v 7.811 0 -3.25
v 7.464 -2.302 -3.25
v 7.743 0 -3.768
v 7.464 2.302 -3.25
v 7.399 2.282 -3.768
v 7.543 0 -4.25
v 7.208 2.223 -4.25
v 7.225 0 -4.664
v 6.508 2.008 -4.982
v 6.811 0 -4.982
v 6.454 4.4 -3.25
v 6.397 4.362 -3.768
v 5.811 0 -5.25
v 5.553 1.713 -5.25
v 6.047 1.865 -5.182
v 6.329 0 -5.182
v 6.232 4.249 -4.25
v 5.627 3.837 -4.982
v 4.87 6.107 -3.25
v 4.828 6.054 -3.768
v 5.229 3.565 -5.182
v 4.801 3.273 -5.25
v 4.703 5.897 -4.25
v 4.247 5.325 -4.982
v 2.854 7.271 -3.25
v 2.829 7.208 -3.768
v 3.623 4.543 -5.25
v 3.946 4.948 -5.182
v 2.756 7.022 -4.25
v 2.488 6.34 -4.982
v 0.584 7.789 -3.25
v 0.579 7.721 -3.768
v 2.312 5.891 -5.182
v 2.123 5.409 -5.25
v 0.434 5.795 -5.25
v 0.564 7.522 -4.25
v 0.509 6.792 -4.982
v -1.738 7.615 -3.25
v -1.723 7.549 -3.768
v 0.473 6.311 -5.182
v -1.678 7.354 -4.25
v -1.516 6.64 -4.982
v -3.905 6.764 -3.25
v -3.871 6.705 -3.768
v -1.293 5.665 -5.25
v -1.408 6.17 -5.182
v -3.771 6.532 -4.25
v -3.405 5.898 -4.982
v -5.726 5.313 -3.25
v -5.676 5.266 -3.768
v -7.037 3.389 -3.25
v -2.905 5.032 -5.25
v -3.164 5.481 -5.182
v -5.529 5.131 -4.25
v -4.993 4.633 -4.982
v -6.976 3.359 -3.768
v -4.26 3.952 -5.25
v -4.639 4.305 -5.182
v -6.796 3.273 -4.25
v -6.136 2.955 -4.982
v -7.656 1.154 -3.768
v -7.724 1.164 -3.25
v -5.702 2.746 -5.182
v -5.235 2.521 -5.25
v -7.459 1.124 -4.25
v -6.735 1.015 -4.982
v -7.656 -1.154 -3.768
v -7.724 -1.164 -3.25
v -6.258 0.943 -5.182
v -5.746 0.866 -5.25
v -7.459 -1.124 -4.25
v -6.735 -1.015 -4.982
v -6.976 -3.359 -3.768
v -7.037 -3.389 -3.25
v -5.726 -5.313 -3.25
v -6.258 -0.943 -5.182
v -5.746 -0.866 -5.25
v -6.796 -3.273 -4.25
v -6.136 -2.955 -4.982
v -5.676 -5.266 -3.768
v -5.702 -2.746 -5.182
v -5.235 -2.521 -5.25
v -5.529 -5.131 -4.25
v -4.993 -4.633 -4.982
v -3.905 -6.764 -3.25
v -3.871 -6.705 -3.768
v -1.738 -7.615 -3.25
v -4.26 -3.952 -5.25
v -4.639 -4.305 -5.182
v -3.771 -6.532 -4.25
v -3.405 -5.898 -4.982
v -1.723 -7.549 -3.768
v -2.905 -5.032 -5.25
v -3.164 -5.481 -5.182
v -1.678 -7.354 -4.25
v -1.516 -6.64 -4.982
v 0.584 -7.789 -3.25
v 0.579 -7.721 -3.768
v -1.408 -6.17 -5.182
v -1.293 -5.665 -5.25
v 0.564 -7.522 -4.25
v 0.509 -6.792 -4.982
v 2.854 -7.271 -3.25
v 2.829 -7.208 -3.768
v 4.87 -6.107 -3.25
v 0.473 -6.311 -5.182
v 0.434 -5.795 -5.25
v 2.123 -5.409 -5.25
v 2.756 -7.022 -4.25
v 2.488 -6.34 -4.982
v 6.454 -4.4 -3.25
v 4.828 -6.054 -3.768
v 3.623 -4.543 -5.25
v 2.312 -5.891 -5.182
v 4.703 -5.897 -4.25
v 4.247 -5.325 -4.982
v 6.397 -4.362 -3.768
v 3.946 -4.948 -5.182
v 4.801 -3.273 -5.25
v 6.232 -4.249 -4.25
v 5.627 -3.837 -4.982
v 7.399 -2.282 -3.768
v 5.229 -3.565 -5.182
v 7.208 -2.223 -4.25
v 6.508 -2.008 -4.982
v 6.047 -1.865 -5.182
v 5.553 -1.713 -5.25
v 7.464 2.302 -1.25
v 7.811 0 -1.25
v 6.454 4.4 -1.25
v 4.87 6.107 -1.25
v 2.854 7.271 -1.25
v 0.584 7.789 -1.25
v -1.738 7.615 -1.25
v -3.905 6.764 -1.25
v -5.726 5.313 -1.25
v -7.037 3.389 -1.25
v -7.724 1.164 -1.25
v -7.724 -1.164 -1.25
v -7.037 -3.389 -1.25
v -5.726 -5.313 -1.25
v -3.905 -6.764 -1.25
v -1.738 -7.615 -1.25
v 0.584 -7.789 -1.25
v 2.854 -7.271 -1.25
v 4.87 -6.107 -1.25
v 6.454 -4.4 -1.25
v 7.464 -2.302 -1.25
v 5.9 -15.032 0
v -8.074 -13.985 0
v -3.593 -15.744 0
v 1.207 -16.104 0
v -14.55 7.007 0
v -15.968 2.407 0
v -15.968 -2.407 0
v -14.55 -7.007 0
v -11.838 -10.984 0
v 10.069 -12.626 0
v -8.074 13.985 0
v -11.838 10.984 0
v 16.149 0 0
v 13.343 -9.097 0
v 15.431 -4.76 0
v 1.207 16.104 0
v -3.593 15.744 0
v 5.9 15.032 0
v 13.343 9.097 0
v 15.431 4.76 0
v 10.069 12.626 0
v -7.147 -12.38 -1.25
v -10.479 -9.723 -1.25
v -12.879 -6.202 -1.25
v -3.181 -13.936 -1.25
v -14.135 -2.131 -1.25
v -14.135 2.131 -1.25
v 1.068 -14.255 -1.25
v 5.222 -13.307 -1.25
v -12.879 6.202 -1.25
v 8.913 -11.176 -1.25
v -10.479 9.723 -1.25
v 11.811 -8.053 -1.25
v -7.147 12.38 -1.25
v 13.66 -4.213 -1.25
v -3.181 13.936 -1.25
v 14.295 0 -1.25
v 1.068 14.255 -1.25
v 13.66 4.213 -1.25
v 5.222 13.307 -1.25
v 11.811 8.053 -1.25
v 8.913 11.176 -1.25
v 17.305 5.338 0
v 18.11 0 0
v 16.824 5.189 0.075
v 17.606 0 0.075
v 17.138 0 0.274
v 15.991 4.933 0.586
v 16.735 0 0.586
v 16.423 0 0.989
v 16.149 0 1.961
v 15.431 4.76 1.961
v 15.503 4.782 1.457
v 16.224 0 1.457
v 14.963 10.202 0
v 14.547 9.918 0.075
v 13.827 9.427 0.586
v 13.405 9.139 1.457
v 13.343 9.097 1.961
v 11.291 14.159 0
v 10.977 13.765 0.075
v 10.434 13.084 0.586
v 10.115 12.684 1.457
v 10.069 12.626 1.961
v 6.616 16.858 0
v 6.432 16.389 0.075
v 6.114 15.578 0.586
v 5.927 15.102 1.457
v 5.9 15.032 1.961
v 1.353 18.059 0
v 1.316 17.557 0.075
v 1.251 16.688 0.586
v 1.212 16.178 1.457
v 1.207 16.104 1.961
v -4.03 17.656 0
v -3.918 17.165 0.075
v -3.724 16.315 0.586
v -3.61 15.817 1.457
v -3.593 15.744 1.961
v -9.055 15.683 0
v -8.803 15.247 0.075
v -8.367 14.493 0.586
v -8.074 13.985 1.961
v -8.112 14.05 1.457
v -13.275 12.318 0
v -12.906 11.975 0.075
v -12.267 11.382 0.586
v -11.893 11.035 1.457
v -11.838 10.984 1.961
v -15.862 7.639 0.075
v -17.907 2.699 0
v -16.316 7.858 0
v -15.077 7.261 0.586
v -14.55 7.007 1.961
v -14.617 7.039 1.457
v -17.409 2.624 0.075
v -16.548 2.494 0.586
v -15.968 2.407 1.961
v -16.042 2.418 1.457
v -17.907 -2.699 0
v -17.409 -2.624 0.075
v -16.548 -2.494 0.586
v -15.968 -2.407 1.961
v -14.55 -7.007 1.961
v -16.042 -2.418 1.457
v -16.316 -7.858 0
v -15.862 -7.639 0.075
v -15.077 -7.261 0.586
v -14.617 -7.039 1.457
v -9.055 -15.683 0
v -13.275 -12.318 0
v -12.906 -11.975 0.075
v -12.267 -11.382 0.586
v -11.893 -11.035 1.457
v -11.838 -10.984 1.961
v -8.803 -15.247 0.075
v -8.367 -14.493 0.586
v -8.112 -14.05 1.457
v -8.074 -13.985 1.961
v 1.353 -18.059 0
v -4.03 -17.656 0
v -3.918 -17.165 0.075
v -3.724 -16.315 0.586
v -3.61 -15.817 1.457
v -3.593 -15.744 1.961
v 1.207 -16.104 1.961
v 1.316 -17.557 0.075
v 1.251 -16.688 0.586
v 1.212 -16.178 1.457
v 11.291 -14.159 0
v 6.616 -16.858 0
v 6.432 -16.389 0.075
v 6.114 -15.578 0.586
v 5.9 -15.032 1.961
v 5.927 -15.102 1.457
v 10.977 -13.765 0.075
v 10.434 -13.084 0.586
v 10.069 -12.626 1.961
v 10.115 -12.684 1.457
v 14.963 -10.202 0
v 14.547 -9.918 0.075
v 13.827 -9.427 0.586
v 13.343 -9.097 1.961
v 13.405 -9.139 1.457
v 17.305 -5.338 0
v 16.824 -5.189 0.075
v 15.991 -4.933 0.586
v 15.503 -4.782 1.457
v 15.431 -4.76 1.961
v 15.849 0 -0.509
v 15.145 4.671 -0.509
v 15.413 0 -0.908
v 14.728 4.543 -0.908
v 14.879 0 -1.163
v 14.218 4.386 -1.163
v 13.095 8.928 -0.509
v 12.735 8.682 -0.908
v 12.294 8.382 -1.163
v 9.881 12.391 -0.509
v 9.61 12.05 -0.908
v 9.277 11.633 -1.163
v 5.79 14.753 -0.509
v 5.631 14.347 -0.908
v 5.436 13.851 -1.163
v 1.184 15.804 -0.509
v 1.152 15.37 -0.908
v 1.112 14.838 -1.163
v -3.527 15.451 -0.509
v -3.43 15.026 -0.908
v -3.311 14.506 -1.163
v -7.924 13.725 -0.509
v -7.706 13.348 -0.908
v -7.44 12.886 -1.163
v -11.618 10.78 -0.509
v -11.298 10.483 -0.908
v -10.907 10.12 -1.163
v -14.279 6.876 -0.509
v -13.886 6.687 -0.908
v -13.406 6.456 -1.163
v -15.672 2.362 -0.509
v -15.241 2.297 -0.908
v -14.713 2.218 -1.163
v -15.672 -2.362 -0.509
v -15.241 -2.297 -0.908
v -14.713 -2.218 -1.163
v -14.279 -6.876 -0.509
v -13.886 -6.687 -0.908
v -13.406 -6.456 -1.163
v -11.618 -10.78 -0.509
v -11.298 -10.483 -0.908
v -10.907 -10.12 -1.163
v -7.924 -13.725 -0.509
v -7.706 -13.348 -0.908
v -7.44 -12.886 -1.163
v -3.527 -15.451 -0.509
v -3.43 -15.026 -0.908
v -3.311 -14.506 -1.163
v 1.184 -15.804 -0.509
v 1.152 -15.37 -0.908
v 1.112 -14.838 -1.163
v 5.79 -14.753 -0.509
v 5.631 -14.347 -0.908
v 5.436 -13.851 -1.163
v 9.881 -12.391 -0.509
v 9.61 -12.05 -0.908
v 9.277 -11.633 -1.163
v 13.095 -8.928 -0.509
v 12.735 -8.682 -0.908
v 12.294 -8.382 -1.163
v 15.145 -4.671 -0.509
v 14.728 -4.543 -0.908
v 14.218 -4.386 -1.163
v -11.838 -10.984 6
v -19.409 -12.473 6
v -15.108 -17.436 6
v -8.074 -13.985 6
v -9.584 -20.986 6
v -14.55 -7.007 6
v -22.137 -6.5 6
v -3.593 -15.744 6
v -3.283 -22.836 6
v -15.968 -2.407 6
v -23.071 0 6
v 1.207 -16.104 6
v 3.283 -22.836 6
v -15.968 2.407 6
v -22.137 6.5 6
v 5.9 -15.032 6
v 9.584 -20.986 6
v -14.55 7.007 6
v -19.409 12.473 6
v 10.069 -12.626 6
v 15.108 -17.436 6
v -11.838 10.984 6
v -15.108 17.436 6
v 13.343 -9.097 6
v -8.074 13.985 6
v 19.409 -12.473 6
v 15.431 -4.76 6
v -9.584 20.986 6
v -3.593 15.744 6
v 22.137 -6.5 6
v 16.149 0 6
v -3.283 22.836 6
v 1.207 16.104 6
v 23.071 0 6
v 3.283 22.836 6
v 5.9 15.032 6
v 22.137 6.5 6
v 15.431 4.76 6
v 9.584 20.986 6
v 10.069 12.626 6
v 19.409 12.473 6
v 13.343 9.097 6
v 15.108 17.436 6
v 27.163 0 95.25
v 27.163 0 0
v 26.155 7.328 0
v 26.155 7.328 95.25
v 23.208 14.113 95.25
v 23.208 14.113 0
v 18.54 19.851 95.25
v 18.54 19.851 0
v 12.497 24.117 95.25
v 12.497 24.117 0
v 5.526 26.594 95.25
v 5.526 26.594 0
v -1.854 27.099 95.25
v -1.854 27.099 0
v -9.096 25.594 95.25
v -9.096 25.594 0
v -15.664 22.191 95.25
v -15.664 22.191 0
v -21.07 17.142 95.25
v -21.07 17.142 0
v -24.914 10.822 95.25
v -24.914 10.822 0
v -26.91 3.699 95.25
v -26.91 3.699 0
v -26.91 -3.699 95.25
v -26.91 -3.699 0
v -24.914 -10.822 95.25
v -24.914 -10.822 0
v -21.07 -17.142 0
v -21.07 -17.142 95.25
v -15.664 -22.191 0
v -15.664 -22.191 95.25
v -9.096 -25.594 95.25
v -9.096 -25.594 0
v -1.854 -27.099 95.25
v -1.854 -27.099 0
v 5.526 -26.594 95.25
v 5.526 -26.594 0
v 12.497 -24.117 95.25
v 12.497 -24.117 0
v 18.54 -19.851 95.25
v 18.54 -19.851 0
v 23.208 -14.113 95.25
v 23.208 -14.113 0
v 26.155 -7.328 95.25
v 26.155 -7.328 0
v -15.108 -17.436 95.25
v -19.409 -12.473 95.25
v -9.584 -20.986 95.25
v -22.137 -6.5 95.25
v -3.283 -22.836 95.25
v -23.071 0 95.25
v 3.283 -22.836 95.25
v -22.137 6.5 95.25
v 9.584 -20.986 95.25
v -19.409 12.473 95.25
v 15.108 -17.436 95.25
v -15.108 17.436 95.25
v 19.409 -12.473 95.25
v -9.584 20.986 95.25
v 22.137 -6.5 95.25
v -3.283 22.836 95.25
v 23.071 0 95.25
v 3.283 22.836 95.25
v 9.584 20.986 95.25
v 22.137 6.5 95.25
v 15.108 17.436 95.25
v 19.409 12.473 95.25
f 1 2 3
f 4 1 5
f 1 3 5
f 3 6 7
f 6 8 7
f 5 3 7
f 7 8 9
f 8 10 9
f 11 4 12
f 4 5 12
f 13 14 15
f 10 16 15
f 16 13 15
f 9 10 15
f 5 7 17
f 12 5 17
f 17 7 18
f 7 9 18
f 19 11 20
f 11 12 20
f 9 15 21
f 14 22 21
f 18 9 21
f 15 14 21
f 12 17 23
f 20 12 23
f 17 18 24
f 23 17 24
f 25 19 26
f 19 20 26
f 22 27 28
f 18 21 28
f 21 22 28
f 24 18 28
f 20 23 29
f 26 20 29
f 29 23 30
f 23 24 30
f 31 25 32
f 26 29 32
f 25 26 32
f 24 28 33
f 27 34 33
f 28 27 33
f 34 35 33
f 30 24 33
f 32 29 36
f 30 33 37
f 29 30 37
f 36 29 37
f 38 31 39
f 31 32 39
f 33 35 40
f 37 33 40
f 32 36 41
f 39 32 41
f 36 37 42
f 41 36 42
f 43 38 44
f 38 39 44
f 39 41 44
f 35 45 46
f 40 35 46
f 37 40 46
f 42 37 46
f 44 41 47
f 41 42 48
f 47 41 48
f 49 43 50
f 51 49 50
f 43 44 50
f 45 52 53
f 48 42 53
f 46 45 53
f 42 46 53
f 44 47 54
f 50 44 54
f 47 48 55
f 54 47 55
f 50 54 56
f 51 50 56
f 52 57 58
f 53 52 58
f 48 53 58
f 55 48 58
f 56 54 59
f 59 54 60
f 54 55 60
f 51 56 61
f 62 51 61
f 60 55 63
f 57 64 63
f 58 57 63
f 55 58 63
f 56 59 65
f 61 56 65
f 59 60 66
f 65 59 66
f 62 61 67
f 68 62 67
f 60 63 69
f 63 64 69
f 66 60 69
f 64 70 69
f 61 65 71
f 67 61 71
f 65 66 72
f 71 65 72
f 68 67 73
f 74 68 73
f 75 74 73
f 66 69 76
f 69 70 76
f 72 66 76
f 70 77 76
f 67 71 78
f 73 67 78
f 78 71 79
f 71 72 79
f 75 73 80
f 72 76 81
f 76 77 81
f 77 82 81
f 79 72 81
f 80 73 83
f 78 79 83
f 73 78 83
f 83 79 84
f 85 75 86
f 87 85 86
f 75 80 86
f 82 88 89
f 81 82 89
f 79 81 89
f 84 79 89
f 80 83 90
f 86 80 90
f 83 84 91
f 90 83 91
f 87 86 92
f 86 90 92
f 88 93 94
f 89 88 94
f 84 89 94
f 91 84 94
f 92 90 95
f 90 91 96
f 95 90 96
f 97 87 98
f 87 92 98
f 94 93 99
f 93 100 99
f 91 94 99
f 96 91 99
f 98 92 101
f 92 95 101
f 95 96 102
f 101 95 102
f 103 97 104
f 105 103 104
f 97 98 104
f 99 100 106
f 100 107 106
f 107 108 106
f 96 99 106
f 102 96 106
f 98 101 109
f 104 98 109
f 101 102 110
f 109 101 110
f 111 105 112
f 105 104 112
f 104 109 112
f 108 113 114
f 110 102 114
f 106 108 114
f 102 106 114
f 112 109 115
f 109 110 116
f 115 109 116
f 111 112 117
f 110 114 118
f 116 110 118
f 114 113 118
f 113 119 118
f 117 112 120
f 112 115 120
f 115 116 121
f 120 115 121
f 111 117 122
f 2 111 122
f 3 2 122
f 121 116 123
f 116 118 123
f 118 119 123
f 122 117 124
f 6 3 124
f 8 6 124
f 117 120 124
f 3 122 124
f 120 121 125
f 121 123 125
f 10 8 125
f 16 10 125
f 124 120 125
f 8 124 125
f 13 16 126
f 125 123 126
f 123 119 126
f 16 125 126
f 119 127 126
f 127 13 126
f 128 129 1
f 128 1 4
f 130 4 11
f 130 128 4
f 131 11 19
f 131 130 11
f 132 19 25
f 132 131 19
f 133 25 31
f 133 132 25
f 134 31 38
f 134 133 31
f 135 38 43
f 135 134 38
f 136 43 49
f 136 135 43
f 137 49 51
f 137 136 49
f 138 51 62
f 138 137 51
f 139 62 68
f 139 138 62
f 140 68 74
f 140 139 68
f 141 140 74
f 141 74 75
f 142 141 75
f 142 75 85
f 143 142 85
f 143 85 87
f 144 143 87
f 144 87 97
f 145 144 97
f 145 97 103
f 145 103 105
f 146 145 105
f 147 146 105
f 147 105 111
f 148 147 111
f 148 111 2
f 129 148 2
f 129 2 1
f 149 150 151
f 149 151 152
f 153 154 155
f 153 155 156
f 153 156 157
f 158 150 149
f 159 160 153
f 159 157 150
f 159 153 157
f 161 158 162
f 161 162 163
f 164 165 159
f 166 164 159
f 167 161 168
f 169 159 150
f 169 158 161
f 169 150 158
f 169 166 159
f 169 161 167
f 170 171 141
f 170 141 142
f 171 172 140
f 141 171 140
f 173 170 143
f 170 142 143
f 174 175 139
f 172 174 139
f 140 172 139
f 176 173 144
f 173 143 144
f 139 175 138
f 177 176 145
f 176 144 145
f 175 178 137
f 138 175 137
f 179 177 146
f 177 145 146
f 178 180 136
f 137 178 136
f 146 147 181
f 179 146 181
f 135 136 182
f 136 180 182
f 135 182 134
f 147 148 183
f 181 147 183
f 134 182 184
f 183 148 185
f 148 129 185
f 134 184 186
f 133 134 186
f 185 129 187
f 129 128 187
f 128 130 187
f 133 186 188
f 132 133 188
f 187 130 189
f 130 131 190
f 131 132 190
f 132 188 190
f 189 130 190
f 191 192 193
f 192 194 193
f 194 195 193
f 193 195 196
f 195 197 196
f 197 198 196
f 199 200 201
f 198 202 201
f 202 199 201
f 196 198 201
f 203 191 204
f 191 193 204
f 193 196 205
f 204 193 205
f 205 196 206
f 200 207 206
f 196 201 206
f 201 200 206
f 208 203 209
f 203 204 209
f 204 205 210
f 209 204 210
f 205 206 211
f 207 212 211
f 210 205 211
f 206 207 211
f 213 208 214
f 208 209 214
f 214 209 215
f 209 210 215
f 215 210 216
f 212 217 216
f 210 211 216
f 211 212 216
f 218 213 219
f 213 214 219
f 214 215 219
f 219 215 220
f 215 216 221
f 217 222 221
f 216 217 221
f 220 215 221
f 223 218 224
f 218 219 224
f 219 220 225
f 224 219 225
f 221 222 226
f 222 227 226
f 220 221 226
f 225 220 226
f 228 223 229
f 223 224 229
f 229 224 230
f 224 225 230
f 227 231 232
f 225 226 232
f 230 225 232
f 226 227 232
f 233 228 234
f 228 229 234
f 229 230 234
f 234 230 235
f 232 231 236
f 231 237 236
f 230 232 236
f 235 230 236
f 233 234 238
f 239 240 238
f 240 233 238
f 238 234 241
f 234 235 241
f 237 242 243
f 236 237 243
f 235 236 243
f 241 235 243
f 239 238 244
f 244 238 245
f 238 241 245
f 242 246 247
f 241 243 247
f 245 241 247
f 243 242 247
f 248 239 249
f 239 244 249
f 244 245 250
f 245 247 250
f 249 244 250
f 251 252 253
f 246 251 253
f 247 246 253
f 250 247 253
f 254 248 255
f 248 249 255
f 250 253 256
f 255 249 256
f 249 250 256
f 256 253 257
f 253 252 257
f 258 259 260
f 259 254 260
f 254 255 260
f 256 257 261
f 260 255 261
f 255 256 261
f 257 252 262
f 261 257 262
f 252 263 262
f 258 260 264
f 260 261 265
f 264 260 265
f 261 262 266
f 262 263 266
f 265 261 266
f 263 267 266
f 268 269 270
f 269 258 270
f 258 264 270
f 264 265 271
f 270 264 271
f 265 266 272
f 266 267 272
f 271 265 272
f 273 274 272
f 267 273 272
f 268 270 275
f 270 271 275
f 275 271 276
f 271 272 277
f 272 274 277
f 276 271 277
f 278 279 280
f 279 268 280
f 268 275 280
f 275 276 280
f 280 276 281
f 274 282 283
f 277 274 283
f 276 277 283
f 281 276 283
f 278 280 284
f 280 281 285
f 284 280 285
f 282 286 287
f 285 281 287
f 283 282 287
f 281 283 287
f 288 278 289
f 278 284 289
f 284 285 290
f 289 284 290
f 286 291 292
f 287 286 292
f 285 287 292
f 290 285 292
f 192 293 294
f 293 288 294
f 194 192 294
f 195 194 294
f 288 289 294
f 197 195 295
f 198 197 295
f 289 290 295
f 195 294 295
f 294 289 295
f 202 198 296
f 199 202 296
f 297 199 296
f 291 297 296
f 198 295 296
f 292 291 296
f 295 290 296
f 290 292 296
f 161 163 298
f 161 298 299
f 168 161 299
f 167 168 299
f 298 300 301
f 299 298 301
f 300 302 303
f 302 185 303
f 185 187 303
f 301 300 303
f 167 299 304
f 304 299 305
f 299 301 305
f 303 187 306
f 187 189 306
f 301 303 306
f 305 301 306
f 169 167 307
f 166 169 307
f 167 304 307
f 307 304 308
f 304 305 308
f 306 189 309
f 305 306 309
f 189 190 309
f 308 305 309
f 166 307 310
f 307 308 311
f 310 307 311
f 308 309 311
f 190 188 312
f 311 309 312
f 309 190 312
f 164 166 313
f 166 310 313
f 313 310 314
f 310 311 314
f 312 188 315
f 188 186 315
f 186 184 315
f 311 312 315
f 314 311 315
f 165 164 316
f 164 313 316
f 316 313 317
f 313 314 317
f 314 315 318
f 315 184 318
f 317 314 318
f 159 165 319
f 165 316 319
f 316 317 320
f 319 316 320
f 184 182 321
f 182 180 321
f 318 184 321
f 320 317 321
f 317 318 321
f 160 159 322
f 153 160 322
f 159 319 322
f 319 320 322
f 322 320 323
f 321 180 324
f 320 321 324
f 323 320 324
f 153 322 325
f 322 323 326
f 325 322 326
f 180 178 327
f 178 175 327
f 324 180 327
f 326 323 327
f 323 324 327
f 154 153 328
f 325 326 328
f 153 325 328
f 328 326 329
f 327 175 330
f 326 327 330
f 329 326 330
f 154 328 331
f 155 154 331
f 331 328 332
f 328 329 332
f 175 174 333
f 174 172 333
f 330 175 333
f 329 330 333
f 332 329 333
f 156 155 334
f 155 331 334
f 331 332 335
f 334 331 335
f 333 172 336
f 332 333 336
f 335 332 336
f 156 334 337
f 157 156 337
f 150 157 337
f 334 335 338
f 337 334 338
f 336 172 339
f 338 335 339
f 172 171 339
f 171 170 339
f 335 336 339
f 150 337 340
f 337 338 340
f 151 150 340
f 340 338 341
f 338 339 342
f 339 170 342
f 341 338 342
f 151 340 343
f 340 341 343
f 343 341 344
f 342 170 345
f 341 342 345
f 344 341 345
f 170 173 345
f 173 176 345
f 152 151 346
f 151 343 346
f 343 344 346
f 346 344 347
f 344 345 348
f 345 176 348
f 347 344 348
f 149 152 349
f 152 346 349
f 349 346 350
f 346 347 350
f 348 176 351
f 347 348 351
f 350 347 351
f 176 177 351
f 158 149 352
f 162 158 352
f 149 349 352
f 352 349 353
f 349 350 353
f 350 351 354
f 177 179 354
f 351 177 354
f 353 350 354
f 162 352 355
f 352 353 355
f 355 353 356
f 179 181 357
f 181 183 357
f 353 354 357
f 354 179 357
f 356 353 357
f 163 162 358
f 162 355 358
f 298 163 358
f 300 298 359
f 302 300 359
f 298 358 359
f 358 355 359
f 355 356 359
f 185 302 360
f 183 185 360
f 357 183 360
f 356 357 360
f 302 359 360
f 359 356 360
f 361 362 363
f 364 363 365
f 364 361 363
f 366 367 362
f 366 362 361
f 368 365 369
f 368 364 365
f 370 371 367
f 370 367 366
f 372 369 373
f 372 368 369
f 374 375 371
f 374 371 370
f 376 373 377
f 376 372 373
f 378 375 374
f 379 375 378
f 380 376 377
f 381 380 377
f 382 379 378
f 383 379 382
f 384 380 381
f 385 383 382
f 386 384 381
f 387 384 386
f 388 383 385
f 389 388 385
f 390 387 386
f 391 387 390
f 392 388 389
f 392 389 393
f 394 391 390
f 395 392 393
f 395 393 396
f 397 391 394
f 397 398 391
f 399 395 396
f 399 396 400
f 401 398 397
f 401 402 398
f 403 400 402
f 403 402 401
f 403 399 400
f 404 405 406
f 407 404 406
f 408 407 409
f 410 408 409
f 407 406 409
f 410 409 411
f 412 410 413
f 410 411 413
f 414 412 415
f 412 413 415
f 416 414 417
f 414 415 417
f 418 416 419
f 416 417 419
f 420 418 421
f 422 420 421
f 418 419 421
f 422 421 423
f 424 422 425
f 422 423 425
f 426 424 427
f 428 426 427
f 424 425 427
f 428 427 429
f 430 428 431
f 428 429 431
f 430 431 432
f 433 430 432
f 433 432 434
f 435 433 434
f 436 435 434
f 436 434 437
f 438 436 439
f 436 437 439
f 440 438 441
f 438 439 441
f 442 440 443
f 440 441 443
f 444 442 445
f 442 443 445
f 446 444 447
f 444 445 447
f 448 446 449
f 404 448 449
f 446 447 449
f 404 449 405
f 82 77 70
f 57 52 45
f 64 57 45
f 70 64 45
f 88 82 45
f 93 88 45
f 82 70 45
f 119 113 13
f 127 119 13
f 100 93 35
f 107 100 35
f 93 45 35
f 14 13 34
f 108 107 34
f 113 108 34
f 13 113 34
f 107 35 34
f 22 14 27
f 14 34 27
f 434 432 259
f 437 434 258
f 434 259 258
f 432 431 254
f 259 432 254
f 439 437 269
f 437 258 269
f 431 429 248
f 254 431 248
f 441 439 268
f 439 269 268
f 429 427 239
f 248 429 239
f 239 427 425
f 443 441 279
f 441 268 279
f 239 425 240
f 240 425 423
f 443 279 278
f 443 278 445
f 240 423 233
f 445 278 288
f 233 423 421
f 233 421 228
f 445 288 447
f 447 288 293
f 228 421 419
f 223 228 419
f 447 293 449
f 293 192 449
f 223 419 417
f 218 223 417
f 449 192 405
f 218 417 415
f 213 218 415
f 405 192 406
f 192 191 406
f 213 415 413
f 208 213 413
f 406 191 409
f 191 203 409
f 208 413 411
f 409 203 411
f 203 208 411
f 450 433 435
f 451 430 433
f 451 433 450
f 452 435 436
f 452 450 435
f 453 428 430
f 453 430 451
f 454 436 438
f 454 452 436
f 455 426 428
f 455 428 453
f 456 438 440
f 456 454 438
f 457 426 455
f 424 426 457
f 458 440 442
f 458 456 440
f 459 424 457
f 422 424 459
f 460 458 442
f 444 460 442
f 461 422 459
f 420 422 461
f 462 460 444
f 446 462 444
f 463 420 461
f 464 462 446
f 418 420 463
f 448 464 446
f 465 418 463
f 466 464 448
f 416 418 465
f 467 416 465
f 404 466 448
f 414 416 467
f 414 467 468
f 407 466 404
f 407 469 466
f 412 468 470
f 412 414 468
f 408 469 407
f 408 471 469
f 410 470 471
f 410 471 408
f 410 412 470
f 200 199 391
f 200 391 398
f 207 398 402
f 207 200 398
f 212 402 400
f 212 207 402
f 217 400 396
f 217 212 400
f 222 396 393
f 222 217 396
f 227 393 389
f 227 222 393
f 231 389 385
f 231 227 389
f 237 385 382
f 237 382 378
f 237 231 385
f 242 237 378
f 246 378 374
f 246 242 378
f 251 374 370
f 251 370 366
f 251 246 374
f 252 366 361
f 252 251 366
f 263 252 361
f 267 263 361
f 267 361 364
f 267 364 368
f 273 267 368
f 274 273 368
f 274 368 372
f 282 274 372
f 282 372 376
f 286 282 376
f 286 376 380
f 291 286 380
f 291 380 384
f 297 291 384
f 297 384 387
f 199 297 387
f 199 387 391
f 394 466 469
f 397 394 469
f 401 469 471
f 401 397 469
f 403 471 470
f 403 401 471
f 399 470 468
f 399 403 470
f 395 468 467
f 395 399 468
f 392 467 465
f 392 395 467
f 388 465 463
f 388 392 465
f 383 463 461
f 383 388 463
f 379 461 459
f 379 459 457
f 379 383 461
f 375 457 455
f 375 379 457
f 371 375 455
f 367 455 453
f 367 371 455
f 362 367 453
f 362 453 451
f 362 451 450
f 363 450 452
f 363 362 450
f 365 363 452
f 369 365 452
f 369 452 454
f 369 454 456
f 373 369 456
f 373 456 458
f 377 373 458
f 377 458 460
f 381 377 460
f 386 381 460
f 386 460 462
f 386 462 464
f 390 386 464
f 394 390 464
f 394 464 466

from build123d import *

# Parameters (mm, degrees)
F0_R     = 27.1625137683
F0_R_2   = 23.071077157
F1_DEPTH = 95.25
F0_R_3   = 16.1487861192
F2_DEPTH = 6
F0_R_4   = 7.8109444868
F3_DEPTH = 1.25
F4_DEPTH = 5.25


# Not quite as in the source:
# - a fillet or chamfer that OpenCascade refuses, or shapes differently, is made with other operations: its cross-section is extruded or revolved along the edge and cut away or added


with BuildPart() as f1:
    # F0 (on Top) → F1 (new body)
    with BuildSketch(Plane.XY):
        Circle(F0_R)
        Circle(F0_R_2, mode=Mode.SUBTRACT)
    extrude(amount=F1_DEPTH)

    # F0 (on Top) → F2 (join)
    with BuildSketch(Plane.XY):
        Circle(F0_R_2)
        Circle(F0_R_3, mode=Mode.SUBTRACT)
    extrude(amount=F2_DEPTH)

    # F5: fillet of radius 2 on 1 edges, made by hand

    # F5_s1 → F5_t2 (revolve, cut)
    with BuildSketch(Plane.XZ):
        with BuildLine():
            ThreePointArc((18.1497518046, -0.0004), (16.7345725568, 0.5857864376), (16.1483861192, 2.0009656854))
            Line((16.1483861192, 2.0009656854), (15.9482495506, 2.0009656854))
            ThreePointArc((15.9482495506, 2.0009656854), (15.9486495506, 1.0004828427), (15.9486495506, 0))
            Line((15.9486495506, 0), (16.1487861192, -0.2001365685))
            ThreePointArc((16.1487861192, -0.2001365685), (17.1492689619, -0.2001365685), (18.1497518046, -0.2005365685))
            Line((18.1497518046, -0.2005365685), (18.1497518046, -0.0004))
        make_face()
    revolve(axis=Axis((0, 0, 0), (0, 0, 1)), mode=Mode.SUBTRACT)


with BuildPart() as f3:
    # F0 (on Top) → F3 (new body)
    with BuildSketch(Plane.XY):
        Circle(F0_R_3)
        Circle(F0_R_4, mode=Mode.SUBTRACT)
    extrude(amount=-F3_DEPTH)

    # F0 (on Top) → F4 (join)
    with BuildSketch(Plane.XY):
        Circle(F0_R_4)
    extrude(amount=-F4_DEPTH)

    # F5#2: fillet of radius 2 on 2 edges, made by hand

    # F5_2_s1 → F5_2_t2 (revolve, cut)
    with BuildSketch(Plane.XZ):
        with BuildLine():
            ThreePointArc((7.8109444868, -3.25), (7.2251580491, -4.6642135624), (5.8109444868, -5.25))
            Line((5.8109444868, -5.25), (7.8109444868, -5.25))
            Line((7.8109444868, -5.25), (7.8109444868, -3.25))
        make_face()
    revolve(axis=Axis((0, 0, -5.25), (0, 0, 1)), mode=Mode.SUBTRACT)

    # F5_2_s3 → F5_2_t4 (revolve, cut)
    with BuildSketch(Plane.XZ):
        with BuildLine():
            ThreePointArc((16.1487861192, 0), (15.4127704861, -0.9083123952), (14.2947364974, -1.25))
            Line((14.2947364974, -1.25), (16.1487861192, -1.25))
            Line((16.1487861192, -1.25), (16.1487861192, 0))
        make_face()
    revolve(axis=Axis((0, 0, -1.25), (0, 0, 1)), mode=Mode.SUBTRACT)


solid = Compound([f1.part, f3.part])
